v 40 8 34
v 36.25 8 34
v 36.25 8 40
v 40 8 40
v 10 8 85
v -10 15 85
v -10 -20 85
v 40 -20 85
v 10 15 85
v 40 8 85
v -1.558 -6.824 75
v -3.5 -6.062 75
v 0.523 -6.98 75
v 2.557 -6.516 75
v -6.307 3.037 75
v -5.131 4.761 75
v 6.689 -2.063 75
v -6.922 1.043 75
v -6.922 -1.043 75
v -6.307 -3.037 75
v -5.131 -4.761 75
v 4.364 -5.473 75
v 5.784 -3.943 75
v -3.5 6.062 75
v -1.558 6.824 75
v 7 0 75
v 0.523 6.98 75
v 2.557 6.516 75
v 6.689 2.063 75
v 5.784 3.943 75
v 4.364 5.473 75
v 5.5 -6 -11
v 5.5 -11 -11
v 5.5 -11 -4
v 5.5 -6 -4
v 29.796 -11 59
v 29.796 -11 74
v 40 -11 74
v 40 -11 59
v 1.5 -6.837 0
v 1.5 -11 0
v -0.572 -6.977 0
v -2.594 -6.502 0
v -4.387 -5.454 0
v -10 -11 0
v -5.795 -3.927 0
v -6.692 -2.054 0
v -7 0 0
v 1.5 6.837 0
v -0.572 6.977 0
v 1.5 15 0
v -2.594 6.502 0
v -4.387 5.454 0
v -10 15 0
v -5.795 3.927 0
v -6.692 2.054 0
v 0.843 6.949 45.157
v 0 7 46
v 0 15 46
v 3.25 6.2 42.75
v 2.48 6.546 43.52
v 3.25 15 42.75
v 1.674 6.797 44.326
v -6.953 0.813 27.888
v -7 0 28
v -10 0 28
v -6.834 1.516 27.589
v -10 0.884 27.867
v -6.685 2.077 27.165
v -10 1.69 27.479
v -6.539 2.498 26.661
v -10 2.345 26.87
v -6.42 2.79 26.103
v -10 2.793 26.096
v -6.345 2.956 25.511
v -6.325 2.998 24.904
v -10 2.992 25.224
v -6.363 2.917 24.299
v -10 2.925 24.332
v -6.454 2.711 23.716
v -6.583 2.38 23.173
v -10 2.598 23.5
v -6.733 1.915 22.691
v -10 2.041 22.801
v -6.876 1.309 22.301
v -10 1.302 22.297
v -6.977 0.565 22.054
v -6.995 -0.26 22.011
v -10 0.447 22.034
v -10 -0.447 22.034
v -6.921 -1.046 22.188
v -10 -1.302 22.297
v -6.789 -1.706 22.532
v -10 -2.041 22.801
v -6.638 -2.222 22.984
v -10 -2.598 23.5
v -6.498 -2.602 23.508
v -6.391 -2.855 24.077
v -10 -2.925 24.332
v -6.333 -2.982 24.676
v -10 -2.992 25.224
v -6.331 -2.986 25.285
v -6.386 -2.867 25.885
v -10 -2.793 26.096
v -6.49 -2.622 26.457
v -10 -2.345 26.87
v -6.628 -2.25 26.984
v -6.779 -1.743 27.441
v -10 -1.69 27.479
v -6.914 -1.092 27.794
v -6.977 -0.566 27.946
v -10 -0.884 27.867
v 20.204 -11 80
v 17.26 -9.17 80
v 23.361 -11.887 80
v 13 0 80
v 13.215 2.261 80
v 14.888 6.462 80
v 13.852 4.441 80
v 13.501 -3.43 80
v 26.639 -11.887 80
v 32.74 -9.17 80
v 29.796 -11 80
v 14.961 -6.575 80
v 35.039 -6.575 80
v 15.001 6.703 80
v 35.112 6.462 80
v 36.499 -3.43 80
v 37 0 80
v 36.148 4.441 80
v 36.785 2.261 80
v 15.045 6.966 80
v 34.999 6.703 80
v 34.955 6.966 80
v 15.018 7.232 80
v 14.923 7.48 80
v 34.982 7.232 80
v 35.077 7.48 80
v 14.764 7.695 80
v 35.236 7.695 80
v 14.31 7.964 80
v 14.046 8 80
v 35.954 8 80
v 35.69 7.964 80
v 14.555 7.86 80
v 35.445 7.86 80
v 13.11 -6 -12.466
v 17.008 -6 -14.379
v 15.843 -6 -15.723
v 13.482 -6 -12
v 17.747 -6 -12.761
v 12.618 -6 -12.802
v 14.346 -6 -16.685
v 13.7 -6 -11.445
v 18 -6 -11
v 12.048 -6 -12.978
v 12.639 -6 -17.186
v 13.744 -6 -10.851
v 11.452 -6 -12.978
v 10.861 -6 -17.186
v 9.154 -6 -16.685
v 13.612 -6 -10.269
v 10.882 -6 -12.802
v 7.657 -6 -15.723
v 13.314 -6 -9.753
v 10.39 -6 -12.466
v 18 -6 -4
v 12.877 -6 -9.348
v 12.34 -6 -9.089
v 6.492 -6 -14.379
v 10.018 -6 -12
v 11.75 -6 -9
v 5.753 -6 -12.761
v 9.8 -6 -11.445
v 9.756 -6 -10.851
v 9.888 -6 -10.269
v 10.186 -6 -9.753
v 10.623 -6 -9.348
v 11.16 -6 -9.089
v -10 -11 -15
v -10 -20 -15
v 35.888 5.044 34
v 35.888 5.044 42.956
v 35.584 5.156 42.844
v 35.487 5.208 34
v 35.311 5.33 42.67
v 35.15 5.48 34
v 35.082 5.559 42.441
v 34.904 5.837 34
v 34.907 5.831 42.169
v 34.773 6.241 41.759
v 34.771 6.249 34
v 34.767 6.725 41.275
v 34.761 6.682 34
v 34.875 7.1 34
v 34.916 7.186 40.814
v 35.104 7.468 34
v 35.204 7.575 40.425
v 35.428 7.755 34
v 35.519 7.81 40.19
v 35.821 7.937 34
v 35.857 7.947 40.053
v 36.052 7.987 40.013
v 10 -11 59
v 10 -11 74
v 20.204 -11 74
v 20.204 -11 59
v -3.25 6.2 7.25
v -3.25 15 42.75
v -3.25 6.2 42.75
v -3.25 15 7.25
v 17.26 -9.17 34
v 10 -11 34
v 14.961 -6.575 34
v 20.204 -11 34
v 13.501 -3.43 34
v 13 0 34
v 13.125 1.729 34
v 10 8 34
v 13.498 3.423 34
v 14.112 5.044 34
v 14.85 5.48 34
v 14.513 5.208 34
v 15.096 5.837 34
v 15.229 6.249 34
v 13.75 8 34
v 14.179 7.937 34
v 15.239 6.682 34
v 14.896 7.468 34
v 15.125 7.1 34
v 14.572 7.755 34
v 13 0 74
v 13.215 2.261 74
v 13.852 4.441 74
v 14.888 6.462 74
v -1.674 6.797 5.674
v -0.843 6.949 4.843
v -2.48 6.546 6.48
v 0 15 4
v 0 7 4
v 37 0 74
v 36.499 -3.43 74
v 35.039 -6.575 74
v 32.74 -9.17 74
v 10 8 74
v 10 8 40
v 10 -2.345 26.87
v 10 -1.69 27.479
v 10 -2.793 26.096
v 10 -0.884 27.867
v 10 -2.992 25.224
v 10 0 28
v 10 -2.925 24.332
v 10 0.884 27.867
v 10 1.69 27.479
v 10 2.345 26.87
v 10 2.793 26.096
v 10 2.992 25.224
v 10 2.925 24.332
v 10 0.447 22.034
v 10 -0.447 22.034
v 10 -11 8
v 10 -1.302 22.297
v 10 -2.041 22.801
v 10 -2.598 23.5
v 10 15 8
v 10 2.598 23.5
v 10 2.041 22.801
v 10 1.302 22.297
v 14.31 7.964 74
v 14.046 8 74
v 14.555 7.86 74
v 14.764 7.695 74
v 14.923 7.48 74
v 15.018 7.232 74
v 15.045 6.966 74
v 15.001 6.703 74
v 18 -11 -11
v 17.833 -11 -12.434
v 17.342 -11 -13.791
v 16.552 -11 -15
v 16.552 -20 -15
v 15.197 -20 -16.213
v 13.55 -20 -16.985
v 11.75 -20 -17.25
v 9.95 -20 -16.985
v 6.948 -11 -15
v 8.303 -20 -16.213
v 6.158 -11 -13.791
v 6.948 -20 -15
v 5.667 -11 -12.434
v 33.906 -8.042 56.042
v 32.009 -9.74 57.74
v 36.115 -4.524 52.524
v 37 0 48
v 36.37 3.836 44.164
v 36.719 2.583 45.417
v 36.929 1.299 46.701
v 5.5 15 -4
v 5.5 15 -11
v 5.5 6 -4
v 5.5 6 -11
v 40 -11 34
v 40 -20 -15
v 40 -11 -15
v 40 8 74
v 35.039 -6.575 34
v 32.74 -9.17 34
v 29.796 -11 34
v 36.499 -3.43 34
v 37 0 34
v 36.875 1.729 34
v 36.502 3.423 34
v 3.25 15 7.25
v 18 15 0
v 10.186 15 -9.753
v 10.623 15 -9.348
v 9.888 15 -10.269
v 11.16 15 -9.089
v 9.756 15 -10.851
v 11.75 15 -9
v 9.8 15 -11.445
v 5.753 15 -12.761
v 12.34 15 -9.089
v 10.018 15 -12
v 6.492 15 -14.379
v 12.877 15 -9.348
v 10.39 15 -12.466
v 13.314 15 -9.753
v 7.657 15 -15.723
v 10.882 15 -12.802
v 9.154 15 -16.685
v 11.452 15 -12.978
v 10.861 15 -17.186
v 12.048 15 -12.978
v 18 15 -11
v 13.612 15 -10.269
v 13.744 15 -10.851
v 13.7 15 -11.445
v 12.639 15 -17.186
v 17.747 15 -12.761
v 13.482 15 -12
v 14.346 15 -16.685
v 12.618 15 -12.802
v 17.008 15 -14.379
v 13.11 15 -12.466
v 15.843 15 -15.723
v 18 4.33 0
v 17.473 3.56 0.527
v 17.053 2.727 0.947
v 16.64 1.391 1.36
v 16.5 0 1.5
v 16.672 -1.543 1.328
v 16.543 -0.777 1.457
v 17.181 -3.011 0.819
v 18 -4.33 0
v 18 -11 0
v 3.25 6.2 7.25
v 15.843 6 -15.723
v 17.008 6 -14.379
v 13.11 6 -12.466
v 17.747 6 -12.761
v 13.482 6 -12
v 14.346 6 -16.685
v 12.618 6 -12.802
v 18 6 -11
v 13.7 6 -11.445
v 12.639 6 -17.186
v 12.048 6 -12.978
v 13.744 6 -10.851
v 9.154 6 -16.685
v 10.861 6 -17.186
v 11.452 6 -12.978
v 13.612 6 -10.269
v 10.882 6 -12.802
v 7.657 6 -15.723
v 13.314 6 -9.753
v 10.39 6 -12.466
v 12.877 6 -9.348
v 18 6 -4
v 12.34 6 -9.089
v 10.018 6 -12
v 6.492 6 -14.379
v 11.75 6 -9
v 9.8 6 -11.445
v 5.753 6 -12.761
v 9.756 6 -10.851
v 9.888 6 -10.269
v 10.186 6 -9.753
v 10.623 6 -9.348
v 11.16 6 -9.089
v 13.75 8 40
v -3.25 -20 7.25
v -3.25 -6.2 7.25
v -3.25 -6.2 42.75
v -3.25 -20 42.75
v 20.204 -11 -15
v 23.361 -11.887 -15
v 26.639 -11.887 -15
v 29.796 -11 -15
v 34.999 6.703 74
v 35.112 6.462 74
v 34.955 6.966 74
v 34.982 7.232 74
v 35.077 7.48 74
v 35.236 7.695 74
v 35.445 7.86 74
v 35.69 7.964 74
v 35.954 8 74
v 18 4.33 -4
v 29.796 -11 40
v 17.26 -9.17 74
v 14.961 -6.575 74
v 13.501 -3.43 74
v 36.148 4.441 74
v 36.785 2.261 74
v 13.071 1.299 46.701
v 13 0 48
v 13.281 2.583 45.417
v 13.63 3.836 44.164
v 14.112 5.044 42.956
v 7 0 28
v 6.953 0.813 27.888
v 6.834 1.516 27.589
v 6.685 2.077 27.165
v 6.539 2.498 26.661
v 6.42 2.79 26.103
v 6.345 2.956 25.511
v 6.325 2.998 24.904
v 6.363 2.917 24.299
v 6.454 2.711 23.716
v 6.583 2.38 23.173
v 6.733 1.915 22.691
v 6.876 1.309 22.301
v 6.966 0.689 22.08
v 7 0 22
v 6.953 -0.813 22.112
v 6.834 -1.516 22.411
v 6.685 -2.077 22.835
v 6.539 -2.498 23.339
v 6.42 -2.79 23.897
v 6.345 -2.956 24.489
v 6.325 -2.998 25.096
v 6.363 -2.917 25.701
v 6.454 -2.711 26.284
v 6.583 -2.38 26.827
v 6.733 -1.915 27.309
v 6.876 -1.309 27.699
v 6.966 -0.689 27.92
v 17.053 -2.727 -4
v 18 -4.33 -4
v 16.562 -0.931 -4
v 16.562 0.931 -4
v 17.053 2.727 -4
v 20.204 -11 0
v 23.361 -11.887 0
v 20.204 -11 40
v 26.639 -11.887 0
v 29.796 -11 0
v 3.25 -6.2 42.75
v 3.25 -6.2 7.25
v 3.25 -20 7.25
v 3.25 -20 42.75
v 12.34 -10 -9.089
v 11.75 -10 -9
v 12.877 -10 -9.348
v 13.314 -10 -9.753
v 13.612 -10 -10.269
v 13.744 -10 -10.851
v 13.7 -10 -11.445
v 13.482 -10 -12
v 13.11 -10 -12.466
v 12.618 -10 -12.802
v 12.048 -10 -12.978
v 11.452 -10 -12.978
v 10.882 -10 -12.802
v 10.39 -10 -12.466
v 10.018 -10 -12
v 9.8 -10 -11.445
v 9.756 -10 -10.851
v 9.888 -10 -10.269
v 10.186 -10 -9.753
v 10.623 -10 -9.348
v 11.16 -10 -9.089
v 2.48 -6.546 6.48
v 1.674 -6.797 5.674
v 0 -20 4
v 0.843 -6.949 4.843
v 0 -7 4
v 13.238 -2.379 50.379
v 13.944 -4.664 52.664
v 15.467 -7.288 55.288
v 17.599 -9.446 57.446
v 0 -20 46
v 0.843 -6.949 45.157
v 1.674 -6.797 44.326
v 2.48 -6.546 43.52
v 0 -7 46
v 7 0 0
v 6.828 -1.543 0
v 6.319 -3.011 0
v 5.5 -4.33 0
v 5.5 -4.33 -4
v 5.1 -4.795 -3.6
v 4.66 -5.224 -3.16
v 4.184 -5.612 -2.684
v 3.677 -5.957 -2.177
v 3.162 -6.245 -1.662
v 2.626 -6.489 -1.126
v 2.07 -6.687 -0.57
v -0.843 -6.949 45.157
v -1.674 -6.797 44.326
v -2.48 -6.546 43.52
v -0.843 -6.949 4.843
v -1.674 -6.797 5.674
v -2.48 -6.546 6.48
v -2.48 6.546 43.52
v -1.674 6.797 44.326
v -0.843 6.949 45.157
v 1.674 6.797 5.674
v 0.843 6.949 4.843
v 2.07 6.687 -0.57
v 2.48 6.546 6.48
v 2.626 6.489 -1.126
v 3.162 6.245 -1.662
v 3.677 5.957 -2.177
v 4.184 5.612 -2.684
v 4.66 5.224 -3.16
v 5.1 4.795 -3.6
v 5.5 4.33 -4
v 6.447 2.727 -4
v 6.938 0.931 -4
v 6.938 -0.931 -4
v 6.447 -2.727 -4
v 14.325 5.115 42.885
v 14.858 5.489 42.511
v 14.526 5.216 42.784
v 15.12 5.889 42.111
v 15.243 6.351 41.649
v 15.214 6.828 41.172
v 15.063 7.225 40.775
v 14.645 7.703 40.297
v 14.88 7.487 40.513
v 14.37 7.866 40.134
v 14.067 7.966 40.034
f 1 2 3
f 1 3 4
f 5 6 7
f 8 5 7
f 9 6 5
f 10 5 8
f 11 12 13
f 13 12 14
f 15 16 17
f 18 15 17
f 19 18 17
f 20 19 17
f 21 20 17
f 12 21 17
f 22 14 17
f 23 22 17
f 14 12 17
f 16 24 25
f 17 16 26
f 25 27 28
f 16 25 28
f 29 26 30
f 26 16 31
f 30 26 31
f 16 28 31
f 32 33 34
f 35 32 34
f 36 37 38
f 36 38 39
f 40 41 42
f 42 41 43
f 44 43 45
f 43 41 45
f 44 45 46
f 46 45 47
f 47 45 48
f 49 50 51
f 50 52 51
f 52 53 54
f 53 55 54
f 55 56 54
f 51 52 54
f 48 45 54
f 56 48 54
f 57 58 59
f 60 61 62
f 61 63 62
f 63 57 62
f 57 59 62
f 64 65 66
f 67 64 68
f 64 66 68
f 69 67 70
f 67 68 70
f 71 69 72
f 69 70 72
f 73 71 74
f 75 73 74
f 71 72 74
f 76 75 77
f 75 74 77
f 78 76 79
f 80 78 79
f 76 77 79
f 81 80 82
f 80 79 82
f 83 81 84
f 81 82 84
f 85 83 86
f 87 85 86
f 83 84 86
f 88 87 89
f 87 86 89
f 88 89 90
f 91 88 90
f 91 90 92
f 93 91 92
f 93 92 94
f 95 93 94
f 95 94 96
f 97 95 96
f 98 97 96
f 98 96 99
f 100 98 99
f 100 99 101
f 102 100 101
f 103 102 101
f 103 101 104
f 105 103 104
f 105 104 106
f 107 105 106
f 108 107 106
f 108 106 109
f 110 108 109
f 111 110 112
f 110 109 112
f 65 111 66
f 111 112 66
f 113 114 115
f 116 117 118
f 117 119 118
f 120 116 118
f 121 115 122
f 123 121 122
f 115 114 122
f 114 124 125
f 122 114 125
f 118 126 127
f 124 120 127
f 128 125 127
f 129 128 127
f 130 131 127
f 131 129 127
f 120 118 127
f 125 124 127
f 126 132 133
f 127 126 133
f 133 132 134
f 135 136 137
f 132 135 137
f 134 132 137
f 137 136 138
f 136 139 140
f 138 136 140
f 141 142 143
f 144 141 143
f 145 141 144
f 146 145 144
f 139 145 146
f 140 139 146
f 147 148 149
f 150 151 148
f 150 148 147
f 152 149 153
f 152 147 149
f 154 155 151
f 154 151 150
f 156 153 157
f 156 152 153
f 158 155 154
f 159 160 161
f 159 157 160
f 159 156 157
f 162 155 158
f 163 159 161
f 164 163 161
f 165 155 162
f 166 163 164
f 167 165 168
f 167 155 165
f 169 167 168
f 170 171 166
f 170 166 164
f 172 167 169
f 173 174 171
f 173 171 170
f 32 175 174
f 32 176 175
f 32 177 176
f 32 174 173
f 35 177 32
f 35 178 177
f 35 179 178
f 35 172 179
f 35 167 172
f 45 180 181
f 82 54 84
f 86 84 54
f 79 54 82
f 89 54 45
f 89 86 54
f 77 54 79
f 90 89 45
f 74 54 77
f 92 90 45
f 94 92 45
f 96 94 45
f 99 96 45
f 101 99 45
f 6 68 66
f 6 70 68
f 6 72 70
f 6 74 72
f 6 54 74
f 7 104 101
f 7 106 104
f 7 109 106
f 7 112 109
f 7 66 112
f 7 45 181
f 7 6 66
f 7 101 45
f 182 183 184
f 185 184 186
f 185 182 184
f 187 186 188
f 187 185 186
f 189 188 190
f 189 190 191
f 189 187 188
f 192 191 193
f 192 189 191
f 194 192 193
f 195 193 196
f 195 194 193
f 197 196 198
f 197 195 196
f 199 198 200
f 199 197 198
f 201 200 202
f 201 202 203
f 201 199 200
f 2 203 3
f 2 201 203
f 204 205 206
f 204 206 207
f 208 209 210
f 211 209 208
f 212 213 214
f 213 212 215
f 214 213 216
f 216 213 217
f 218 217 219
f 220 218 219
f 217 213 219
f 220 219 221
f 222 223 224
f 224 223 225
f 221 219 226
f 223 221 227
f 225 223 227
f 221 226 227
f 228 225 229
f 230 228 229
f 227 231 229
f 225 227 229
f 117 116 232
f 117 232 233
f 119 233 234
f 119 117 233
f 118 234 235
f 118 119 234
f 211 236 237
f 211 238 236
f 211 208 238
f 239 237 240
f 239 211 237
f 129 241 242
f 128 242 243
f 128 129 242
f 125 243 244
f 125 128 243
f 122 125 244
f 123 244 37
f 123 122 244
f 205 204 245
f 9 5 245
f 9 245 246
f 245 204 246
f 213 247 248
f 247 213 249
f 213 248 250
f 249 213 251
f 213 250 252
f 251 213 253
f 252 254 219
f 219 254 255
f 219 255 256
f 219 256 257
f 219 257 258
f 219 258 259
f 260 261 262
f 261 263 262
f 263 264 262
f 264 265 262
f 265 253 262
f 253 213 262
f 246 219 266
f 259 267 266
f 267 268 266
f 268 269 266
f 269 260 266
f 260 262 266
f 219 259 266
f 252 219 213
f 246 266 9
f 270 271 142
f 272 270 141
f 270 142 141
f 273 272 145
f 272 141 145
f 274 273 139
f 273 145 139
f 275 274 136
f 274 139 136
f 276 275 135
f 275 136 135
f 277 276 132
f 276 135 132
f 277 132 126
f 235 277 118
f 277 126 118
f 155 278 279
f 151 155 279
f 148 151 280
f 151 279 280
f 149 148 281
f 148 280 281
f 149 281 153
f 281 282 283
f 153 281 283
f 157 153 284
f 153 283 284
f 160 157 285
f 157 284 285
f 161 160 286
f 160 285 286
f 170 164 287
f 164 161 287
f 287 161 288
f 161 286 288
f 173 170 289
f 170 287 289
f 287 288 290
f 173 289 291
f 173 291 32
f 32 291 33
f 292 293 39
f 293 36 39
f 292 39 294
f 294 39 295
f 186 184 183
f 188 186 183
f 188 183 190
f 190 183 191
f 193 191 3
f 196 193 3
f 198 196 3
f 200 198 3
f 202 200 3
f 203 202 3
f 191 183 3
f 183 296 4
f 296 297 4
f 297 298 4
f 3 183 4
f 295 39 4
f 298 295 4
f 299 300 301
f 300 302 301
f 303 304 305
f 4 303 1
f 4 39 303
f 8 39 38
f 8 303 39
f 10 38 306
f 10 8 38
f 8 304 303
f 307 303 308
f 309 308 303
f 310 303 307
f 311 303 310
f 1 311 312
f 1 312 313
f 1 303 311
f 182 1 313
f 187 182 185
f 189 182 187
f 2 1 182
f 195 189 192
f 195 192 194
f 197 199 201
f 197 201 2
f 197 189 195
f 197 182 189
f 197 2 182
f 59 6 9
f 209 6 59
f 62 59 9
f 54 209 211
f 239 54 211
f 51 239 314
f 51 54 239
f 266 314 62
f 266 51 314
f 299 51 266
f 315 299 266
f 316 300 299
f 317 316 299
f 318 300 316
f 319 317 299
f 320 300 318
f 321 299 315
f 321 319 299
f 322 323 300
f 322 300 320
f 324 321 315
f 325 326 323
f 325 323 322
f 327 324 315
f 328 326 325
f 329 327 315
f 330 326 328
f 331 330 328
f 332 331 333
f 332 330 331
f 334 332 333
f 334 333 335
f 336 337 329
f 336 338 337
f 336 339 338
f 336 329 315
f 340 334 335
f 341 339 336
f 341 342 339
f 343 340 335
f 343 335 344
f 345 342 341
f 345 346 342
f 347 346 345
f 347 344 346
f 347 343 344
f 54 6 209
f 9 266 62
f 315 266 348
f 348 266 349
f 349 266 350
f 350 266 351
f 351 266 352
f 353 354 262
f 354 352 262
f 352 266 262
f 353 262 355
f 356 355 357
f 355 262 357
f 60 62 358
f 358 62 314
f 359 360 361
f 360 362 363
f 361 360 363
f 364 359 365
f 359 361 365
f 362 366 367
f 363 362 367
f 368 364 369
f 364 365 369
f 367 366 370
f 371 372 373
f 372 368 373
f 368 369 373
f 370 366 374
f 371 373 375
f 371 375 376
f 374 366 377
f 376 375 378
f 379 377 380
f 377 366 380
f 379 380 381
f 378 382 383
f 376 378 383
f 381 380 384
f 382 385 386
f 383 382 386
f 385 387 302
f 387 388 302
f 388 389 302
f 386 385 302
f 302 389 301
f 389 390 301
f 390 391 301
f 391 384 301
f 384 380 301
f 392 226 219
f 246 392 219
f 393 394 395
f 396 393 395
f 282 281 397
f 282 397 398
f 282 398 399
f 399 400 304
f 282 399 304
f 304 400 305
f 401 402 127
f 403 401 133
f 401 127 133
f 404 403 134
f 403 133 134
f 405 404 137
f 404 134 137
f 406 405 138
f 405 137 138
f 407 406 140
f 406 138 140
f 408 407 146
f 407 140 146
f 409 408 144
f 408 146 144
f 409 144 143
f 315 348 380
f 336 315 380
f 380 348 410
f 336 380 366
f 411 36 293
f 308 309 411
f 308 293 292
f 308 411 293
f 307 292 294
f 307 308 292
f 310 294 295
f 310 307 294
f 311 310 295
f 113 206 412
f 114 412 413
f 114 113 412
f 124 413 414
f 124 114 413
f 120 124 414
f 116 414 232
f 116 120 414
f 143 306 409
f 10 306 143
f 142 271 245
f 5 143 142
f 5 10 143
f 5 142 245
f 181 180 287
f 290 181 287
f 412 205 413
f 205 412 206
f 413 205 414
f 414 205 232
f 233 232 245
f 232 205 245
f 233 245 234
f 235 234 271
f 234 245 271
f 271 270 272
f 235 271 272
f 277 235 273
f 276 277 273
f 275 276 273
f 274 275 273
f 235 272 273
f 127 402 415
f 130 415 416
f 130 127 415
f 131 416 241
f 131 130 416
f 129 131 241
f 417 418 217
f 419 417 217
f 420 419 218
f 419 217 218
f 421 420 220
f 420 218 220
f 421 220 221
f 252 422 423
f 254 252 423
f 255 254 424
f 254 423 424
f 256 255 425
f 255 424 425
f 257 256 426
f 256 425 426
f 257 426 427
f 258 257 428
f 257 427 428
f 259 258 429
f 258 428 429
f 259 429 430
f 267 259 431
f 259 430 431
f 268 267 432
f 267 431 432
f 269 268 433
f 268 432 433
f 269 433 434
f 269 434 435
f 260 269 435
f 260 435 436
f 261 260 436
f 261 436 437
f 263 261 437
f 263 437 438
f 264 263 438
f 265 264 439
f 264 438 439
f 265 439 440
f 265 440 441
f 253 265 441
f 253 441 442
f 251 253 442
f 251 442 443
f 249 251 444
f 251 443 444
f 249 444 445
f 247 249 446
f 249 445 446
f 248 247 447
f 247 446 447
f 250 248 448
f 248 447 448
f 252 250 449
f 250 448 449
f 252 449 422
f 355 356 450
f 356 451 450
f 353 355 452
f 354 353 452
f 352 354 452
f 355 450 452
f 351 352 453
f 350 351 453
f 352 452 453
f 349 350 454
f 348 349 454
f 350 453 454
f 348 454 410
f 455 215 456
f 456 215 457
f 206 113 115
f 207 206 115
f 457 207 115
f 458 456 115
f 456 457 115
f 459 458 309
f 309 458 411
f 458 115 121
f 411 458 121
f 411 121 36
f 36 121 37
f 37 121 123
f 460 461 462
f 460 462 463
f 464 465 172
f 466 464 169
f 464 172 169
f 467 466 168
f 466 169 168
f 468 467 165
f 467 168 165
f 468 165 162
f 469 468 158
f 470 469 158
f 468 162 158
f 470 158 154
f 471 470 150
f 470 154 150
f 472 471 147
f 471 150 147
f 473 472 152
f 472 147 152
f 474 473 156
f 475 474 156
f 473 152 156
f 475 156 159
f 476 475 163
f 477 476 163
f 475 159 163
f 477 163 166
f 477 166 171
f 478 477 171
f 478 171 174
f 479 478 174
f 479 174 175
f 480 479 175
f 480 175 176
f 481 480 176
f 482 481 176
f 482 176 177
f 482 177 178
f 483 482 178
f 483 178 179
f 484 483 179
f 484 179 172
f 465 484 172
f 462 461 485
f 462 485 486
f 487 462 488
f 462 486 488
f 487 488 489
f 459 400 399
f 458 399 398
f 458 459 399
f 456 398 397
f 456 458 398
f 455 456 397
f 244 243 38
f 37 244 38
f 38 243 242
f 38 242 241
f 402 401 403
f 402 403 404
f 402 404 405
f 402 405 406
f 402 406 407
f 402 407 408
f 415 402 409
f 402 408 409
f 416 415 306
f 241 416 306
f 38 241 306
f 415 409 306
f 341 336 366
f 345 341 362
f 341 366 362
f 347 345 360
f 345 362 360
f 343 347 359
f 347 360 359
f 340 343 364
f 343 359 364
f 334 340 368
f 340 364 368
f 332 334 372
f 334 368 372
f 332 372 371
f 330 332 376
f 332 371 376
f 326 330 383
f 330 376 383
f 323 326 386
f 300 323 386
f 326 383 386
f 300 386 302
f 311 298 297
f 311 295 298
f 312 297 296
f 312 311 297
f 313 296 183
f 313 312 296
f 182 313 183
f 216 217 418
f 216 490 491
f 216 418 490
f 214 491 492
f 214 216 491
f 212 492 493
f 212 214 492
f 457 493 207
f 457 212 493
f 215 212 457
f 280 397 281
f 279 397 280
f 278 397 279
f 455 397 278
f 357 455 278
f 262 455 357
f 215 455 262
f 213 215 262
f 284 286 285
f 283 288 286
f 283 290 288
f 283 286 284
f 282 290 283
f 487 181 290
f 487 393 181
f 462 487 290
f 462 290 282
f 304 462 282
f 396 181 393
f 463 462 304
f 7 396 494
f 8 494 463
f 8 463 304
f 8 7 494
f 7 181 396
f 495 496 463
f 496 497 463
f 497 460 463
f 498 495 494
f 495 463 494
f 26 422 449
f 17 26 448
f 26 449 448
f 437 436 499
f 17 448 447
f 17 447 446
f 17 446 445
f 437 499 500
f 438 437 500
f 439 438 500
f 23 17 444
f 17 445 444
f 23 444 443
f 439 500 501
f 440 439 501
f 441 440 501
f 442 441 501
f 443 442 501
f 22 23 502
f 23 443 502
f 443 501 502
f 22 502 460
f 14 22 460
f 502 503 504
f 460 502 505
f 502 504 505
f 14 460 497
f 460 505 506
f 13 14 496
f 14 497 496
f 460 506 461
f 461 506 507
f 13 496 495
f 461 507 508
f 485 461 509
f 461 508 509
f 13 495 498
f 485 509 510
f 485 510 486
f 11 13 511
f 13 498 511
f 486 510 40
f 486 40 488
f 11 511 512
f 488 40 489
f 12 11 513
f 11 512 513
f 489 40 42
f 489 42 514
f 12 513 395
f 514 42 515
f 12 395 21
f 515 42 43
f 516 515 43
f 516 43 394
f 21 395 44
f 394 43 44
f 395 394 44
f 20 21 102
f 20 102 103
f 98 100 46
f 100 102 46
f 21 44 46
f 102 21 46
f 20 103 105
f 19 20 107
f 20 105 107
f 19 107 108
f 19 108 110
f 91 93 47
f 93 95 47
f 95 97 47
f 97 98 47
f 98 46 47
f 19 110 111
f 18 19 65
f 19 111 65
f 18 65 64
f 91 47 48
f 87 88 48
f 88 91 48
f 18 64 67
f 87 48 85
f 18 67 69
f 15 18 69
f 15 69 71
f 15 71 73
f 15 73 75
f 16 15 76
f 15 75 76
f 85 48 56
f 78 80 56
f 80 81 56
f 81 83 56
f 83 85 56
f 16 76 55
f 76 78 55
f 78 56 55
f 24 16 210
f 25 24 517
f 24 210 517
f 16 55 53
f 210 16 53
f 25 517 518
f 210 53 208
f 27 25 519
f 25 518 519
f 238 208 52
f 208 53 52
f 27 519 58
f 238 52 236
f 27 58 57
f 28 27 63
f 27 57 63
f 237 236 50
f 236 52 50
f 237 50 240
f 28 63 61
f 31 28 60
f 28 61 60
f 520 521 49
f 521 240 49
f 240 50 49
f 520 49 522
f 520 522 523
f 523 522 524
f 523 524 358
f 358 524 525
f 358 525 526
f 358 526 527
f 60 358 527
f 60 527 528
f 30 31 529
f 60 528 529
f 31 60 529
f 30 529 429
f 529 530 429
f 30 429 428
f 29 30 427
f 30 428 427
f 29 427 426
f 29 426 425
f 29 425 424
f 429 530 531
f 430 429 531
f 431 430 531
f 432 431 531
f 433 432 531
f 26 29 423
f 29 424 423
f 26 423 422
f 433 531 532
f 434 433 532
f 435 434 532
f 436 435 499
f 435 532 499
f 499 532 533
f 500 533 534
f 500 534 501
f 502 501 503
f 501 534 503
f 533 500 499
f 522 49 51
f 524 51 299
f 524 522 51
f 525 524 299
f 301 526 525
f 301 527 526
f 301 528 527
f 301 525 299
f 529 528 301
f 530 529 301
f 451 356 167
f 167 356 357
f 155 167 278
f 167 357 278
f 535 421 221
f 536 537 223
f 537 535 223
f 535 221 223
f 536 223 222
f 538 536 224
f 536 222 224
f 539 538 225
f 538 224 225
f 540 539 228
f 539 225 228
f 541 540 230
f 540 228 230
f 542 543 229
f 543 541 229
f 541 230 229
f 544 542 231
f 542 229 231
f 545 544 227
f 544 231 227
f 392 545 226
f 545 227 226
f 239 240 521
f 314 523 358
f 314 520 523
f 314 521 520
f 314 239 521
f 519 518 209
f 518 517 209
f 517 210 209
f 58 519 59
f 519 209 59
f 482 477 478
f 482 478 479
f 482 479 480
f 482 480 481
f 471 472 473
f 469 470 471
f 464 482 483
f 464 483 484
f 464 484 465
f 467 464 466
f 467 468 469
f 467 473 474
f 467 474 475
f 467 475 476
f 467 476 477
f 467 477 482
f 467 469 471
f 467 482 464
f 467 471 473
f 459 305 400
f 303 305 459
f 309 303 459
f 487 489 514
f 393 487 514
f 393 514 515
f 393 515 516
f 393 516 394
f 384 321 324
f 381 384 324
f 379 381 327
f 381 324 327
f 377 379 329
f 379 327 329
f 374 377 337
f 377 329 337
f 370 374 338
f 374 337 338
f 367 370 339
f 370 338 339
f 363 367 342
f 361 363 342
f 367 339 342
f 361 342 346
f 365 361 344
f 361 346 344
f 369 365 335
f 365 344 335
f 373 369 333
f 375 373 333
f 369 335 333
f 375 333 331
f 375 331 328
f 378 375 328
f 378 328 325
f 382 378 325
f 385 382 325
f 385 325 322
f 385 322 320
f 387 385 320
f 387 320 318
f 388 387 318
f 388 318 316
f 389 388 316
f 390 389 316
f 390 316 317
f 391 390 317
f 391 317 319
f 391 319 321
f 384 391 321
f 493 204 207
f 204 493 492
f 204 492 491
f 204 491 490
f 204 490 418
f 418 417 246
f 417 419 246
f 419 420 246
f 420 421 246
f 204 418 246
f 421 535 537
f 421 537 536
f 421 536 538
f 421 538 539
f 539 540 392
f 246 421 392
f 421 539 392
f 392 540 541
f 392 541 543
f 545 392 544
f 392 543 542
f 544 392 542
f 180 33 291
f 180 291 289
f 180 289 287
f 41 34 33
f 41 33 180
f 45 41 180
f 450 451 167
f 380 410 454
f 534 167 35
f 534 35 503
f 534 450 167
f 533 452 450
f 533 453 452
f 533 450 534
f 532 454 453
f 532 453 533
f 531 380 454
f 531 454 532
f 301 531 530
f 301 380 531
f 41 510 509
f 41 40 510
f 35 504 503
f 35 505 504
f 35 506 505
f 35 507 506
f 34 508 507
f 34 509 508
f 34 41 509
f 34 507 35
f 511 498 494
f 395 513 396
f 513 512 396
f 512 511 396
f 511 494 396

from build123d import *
from build123d.topology import SkipClean

# Parameters (mm, degrees)
SKETCH1_W               = 20
SKETCH1_H               = 30
BOSS_EXTRUDE1_DEPTH     = 85
SKETCH3_R               = 7
CUT_EXTRUDE1_DEPTH      = 75
SKETCH4_R               = 3
CUT_EXTRUDE2_DEPTH      = 89.600225733
SKETCH5_W               = 6.5
SKETCH5_H               = 42
CUT_EXTRUDE3_DEPTH      = 91.691785747
SKETCH6_W               = 85
SKETCH6_H               = 4
BOSS_EXTRUDE2_DEPTH     = 30
BOSS_EXTRUDE3_DEPTH     = 11
SKETCH8_R               = 12
CUT_EXTRUDE4_DEPTH      = 96.131488042
SKETCH9_W               = 30
SKETCH9_H               = 23
BOSS_EXTRUDE4_DEPTH     = 5
BOSS_EXTRUDE5_START     = -45
BOSS_EXTRUDE5_DEPTH     = 6
SKETCH10_W              = 50
SKETCH10_H              = 85
SKETCH10_W_2            = 6.5
SKETCH10_H_2            = 42
BOSS_EXTRUDE6_DEPTH     = 5
BOSS_EXTRUDE7_DEPTH     = 15
BOSS_EXTRUDE8_START     = -9
BOSS_EXTRUDE8_DEPTH     = 35
CUT_EXTRUDE5_DEPTH      = 110.544511501
CUT_EXTRUDE5_DEPTH_BACK = 11
SKETCH13_W              = 12.5
SKETCH13_H              = 12
SKETCH14_R              = 2
CUT_EXTRUDE6_DEPTH      = 25
CUT_EXTRUDE7_DEPTH      = 97.046863561
SKETCH17_R              = 7
CUT_EXTRUDE8_DEPTH      = 10
CHAMFER2_SIZE           = 4
CHAMFER3_START          = 10
CHAMFER3_DEPTH          = 10.204168477
CHAMFER3_START_2        = 29.795831523
CHAMFER3_2_DEPTH        = 10.204168477
CHAMFER3_START_3        = 40
CHAMFER3_3_DEPTH        = 19
BOSS_EXTRUDE9_DEPTH     = 6
FILLET1_R               = 1
BOSS_EXTRUDE10_REACH    = 70.019
CHAMFER5_SIZE           = 3.25


with BuildPart() as part:
    # Sketch1 → Boss-Extrude1 (new body)
    with BuildSketch(Plane.XY):
        Rectangle(SKETCH1_W, SKETCH1_H)
    extrude(amount=BOSS_EXTRUDE1_DEPTH)

    # Sketch3 → Cut-Extrude1 (cut)
    with BuildSketch(Plane.XY):
        Circle(SKETCH3_R)
    extrude(amount=CUT_EXTRUDE1_DEPTH, mode=Mode.SUBTRACT)

    # Sketch4 → Cut-Extrude2 (cut, through all)
    with BuildSketch(Plane.ZY.offset(10)):
        with Locations((25, 0)):
            Circle(SKETCH4_R)
    extrude(amount=-CUT_EXTRUDE2_DEPTH, mode=Mode.SUBTRACT)

    # Sketch5 → Cut-Extrude3 (cut, through all)
    with BuildSketch(Plane(origin=(0, 15, 0), x_dir=(1, 0, 0), z_dir=(0, 1, 0))):
        with Locations((0, -25)):
            Rectangle(SKETCH5_W, SKETCH5_H)
    extrude(amount=-CUT_EXTRUDE3_DEPTH, mode=Mode.SUBTRACT)

    # Sketch6 → Boss-Extrude2 (add)
    with BuildSketch(Plane(origin=(10, 0, 0), x_dir=(0, 0, -1), z_dir=(1, 0, 0))):
        with Locations((-42.5, -13)):
            Rectangle(SKETCH6_W, SKETCH6_H)
    extrude(amount=BOSS_EXTRUDE2_DEPTH)

    # Sketch7 → Boss-Extrude3 (add)
    with BuildSketch(Plane.XY.offset(85)):
        with BuildLine():
            Line((10, -11), (20.204168477, -11))
            ThreePointArc((20.204168477, -11), (14.96132533, -6.574573055), (13, 0))
            Line((13, 0), (13, 8))
            Line((13, 8), (10, 8))
            Line((10, 8), (10, -11))
        make_face()
        with BuildLine():
            Line((40, -11), (40, 8))
            Line((40, 8), (37, 8))
            Line((37, 8), (37, 0))
            ThreePointArc((37, 0), (35.03867467, -6.574573055), (29.795831523, -11))
            Line((29.795831523, -11), (40, -11))
        make_face()
    extrude(amount=-BOSS_EXTRUDE3_DEPTH)

    # Sketch8 → Cut-Extrude4 (cut, through all)
    with SkipClean():  # the faces are left unmerged after this step: merging them gives an invalid solid
        with BuildSketch(Plane.XY.offset(85)):
            with Locations((25, 0)):
                Circle(SKETCH8_R)
        extrude(amount=-CUT_EXTRUDE4_DEPTH, mode=Mode.SUBTRACT)

    # Sketch9 → Boss-Extrude4 (add)
    with SkipClean():  # the faces are left unmerged after this step: merging them gives an invalid solid
        with BuildSketch(Plane.XY.offset(85)):
            with Locations((25, -3.5)):
                Rectangle(SKETCH9_W, SKETCH9_H)
        extrude(amount=-BOSS_EXTRUDE4_DEPTH)

    # Sketch7<3> → Boss-Extrude5 (add)
    with SkipClean():  # the faces are left unmerged after this step: merging them gives an invalid solid
        with BuildSketch(Plane.XY.offset(85).offset(BOSS_EXTRUDE5_START)):
            with BuildLine():
                Line((40, -11), (40, 0))
                Line((40, 0), (40, 8))
                Line((40, 8), (37, 8))
                Line((37, 8), (37, 0))
                ThreePointArc((37, 0), (35.03867467, -6.574573055), (29.795831523, -11))
                Line((29.795831523, -11), (40, -11))
            make_face()
            with BuildLine():
                Line((10, -11), (20.204168477, -11))
                ThreePointArc((20.204168477, -11), (14.96132533, -6.574573055), (13, 0))
                Line((13, 0), (13, 8))
                Line((13, 8), (10, 8))
                Line((10, 8), (10, -11))
            make_face()
        extrude(amount=-BOSS_EXTRUDE5_DEPTH)

    # Sketch10 → Boss-Extrude6 (add)
    with SkipClean():  # the faces are left unmerged after this step: merging them gives an invalid solid
        with BuildSketch(Plane.XZ.offset(15)):
            with Locations((15, 42.5)):
                Rectangle(SKETCH10_W, SKETCH10_H)
            with Locations((0, 25)):
                Rectangle(SKETCH10_W_2, SKETCH10_H_2, mode=Mode.SUBTRACT)
        extrude(amount=BOSS_EXTRUDE6_DEPTH)

    # Sketch11 → Boss-Extrude7 (add)
    with BuildSketch(Plane(origin=(0, 0, 0), x_dir=(-1, 0, 0), z_dir=(0, 0, -1))):
        with BuildLine():
            Line((-10, -11), (10, -11))
            Line((10, -11), (10, -20))
            Line((10, -20), (-40, -20))
            Line((-40, -20), (-40, -11))
            Line((-40, -11), (-29.795831523, -11))
            ThreePointArc((-29.795831523, -11), (-25, -12), (-20.204168477, -11))
            Line((-20.204168477, -11), (-10, -11))
        make_face()
    extrude(amount=BOSS_EXTRUDE7_DEPTH)

    # Sketch12 → Boss-Extrude8 (add)
    with SkipClean():  # the faces are left unmerged after this step: merging them gives an invalid solid
        with BuildSketch(Plane(origin=(0, -11, 0), x_dir=(1, 0, 0), z_dir=(0, 1, 0)).offset(BOSS_EXTRUDE8_START)):
            with BuildLine():
                Line((5.5, 0), (10, 0))
                Line((10, 0), (10, -8))
                Line((10, -8), (18, 0))
                Line((18, 0), (18, 11))
                ThreePointArc((18, 11), (11.75, 17.25), (5.5, 11))
                Line((5.5, 11), (5.5, 0))
            make_face()
        extrude(amount=BOSS_EXTRUDE8_DEPTH)

    # Sketch13 → Cut-Extrude5 (cut, two sides: drawn at the far end of the back side and taken through both)
    with BuildSketch(Plane(origin=(0, 0, -15), x_dir=(-1, 0, 0), z_dir=(0, 0, -1)).offset(-CUT_EXTRUDE5_DEPTH_BACK)):
        with Locations((-11.75, 0)):
            Rectangle(SKETCH13_W, SKETCH13_H)
    extrude(amount=CUT_EXTRUDE5_DEPTH + CUT_EXTRUDE5_DEPTH_BACK, mode=Mode.SUBTRACT)

    # Sketch14 → Cut-Extrude6 (cut)
    with BuildSketch(Plane(origin=(0, 15, 0), x_dir=(1, 0, 0), z_dir=(0, 1, 0))):
        with Locations(Location((11.75, 11, 0), (0, 0, 270))):
            Circle(SKETCH14_R)
    extrude(amount=-CUT_EXTRUDE6_DEPTH, mode=Mode.SUBTRACT)

    # Sketch16 → Cut-Extrude7 (cut, through all)
    with SkipClean():  # the faces are left unmerged after this step: merging them gives an invalid solid
        with BuildSketch(Plane.XY):
            with BuildLine():
                Line((5.5, 4.330127019), (5.5, -4.330127019))
                ThreePointArc((5.5, -4.330127019), (7, 0), (5.5, 4.330127019))
            make_face()
        extrude(amount=-CUT_EXTRUDE7_DEPTH, mode=Mode.SUBTRACT)

    # Sketch17 → Cut-Extrude8 (cut)
    with SkipClean():  # the faces are left unmerged after this step: merging them gives an invalid solid
        with BuildSketch(Plane(origin=(0, 0, -4), x_dir=(-1, 0, 0), z_dir=(0, 0, -1))):
            with Locations((-23.5, 0)):
                Circle(SKETCH17_R)
        extrude(amount=-CUT_EXTRUDE8_DEPTH, mode=Mode.SUBTRACT)

    # Chamfer2
    # the kernel refuses this chamfer: 4 mm, written as the material it adds along each edge
    with BuildSketch(Plane(origin=(5.5, -21.286731952, 0), x_dir=(-1, 0, 0), z_dir=(0, 1, 0))) as chamfer2_piece_1_section:
        Polygon((CHAMFER2_SIZE, 0), (0, -CHAMFER2_SIZE), (0, 0), align=None)
    chamfer2_piece_1 = extrude(amount=27.243336885, mode=Mode.PRIVATE)
    chamfer2_piece_1 = chamfer2_piece_1 - Plane(origin=(0, 0, 0), x_dir=(1, 0, 0), z_dir=(0, 0, -1)) * Cylinder(7, 71, mode=Mode.PRIVATE)
    chamfer2_piece_1 = split(chamfer2_piece_1, bisect_by=Plane(origin=(5.5, -20, 0), z_dir=(0, 1, 0)), keep=Keep.TOP, mode=Mode.PRIVATE)
    add(chamfer2_piece_1)
    with BuildSketch(Plane(origin=(5.5, -5.956604933, 0), x_dir=(-1, 0, 0), z_dir=(0, 1, 0))) as chamfer2_piece_2_section:
        Polygon((CHAMFER2_SIZE, 0), (0, -CHAMFER2_SIZE), (0, 0), align=None)
    chamfer2_piece_2 = extrude(amount=20.956604933, mode=Mode.PRIVATE)
    chamfer2_piece_2 = chamfer2_piece_2 - Plane(origin=(0, 0, 0), x_dir=(1, 0, 0), z_dir=(0, 0, -1)) * Cylinder(7, 58, mode=Mode.PRIVATE)
    add(chamfer2_piece_2)

    # Chamfer3: read off the stored shape, not the designer's step
    # Chamfer3 outline → Chamfer3 (add)
    with SkipClean():  # the faces are left unmerged after this step: merging them gives an invalid solid
        with BuildSketch(Plane.YZ.offset(CHAMFER3_START)):
            Polygon((8, 40), (-11, 59), (-11, 40), align=None)
        extrude(amount=CHAMFER3_DEPTH)
    add(part.part.scale(1), mode=Mode.REPLACE)  # the faces are merged on a copy

    # Chamfer3 2 outline → Chamfer3 2 (add)
    with BuildSketch(Plane.YZ.offset(CHAMFER3_START_2)):
        Polygon((8, 40), (-11, 59), (-11, 40), align=None)
    extrude(amount=CHAMFER3_2_DEPTH)

    # Chamfer3 3 outline → Chamfer3 3 (cut)
    with BuildSketch(Plane.XY.offset(CHAMFER3_START_3)):
        with BuildLine():
            ThreePointArc((29.795831523, -11), (35.03867467, -6.574573055), (37, 0))
            Line((37, 0), (37, 9))
            Line((37, 9), (29.795831523, 9))
            Line((29.795831523, 9), (29.795831523, -11))
        make_face()
        with BuildLine():
            ThreePointArc((13, 0), (14.96132533, -6.574573055), (20.204168477, -11))
            Line((20.204168477, -11), (20.204168477, 9))
            Line((20.204168477, 9), (13, 9))
            Line((13, 9), (13, 0))
        make_face()
    extrude(amount=CHAMFER3_3_DEPTH, mode=Mode.SUBTRACT)

    # Sketch19 → Boss-Extrude9 (add)
    with BuildSketch(Plane(origin=(0, 0, 80), x_dir=(-1, 0, 0), z_dir=(0, 0, -1))):
        with BuildLine():
            Line((-37, 0), (-37, 8))
            Line((-37, 8), (-33.94427191, 8))
            ThreePointArc((-33.94427191, 8), (-36.210068308, 4.281865077), (-37, 0))
        make_face()
        with BuildLine():
            Line((-13, 8), (-13, 0))
            ThreePointArc((-13, 0), (-13.789931692, 4.281865077), (-16.05572809, 8))
            Line((-16.05572809, 8), (-13, 8))
        make_face()
    extrude(amount=BOSS_EXTRUDE9_DEPTH)

    # Fillet1
    # the kernel refuses this fillet: 1 mm, written as the material it takes off along each edge
    with BuildSketch(Plane(origin=(33.94427191, 8, 80), x_dir=(1, 0, 0), z_dir=(0, 0, -1))) as fillet1_piece_1:
        with BuildLine():
            CenterArc((2.01017924, 1), FILLET1_R, 147.421029607, 122.578970393)
            ThreePointArc((1.167529152, 1.538461538), (0.61476545, 0.745704393), (0, 0))
            Line((0, 0), (2.01017924, 0))
        make_face()
    extrude(amount=11.0254481, mode=Mode.SUBTRACT)
    with BuildSketch(Plane(origin=(16.05572809, 8, 80), x_dir=(-1, 0, 0), z_dir=(0, 0, -1))) as fillet1_piece_2:
        with BuildLine():
            CenterArc((2.01017924, -1), FILLET1_R, 90, 122.578970393)
            ThreePointArc((1.167529152, -1.538461538), (0.61476545, -0.745704393), (0, 0))
            Line((0, 0), (2.01017924, 0))
        make_face()
    extrude(amount=11.0254481, mode=Mode.SUBTRACT)

    # Boss-Extrude10: up to this plane
    boss_extrude10_end = Plane(origin=(40, -11, 59), z_dir=(0, -0.7071067811865512, -0.7071067811865438))
    # Sketch20 → Boss-Extrude10 (add, up to the surface)
    with BuildSketch(Plane(origin=(0, 0, 34), x_dir=(-1, 0, 0), z_dir=(0, 0, -1)), mode=Mode.PRIVATE) as boss_extrude10_sk1:
        with BuildLine():
            Line((-36.25, 8), (-37, 8))
            Line((-37, 8), (-37, 0))
            ThreePointArc((-37, 0), (-36.718784369, 2.582652302), (-35.888317848, 5.044257571))
            ThreePointArc((-35.888317848, 5.044257571), (-34.761105503, 6.68218995), (-36.25, 8))
        make_face()
    boss_extrude10_tool1 = split(extrude(boss_extrude10_sk1.sketch, amount=-BOSS_EXTRUDE10_REACH, mode=Mode.PRIVATE), bisect_by=boss_extrude10_end, keep=Keep.BOTH, mode=Mode.PRIVATE)
    add(boss_extrude10_tool1.solids().sort_by_distance((36.164364, 5.853869, 34))[0])
    # Sketch20 → Boss-Extrude10 (add, up to the surface)
    with BuildSketch(Plane(origin=(0, 0, 34), x_dir=(-1, 0, 0), z_dir=(0, 0, -1)), mode=Mode.PRIVATE) as boss_extrude10_sk2:
        with BuildLine():
            Line((-13.75, 8), (-13, 8))
            Line((-13, 8), (-13, 0))
            ThreePointArc((-13, 0), (-13.281215631, 2.582652302), (-14.111682152, 5.044257571))
            ThreePointArc((-14.111682152, 5.044257571), (-15.238894497, 6.68218995), (-13.75, 8))
        make_face()
    boss_extrude10_tool2 = split(extrude(boss_extrude10_sk2.sketch, amount=-BOSS_EXTRUDE10_REACH, mode=Mode.PRIVATE), bisect_by=boss_extrude10_end, keep=Keep.BOTH, mode=Mode.PRIVATE)
    add(boss_extrude10_tool2.solids().sort_by_distance((13.835636, 5.853869, 34))[0])

    # Chamfer5
    # the kernel refuses this chamfer: 3.25 mm, written as the material it adds along each edge
    with BuildSketch(Plane(origin=(3.25, 2.158171327, 4), x_dir=(0, 0, 1), z_dir=(0, -1, 0))) as chamfer5_piece_1_section:
        Polygon((CHAMFER5_SIZE, 0), (0, CHAMFER5_SIZE), (0, 0), align=None)
    chamfer5_piece_1 = extrude(amount=22.158171327, mode=Mode.PRIVATE)
    chamfer5_piece_1 = chamfer5_piece_1 - Plane(origin=(0, 0, 4), x_dir=(1, 0, 0), z_dir=(0, 0, -1)) * Cylinder(7, 58, mode=Mode.PRIVATE)
    add(chamfer5_piece_1)
    with BuildSketch(Plane(origin=(3.25, 15, 46), x_dir=(-1, 0, 0), z_dir=(0, -1, 0))) as chamfer5_piece_2_section:
        Polygon((CHAMFER5_SIZE, 0), (0, CHAMFER5_SIZE), (0, 0), align=None)
    chamfer5_piece_2 = extrude(amount=17.158171327, mode=Mode.PRIVATE)
    chamfer5_piece_2 = chamfer5_piece_2 - Plane(origin=(0, 0, 46), x_dir=(1, 0, 0), z_dir=(0, 0, -1)) * Cylinder(7, 48, mode=Mode.PRIVATE)
    add(chamfer5_piece_2)
    with BuildSketch(Plane(origin=(-3.25, 15, 46), x_dir=(0, 0, -1), z_dir=(0, -1, 0))) as chamfer5_piece_3_section:
        Polygon((CHAMFER5_SIZE, 0), (0, CHAMFER5_SIZE), (0, 0), align=None)
    chamfer5_piece_3 = extrude(amount=17.158171327, mode=Mode.PRIVATE)
    chamfer5_piece_3 = chamfer5_piece_3 - Plane(origin=(0, 0, 46), x_dir=(1, 0, 0), z_dir=(0, 0, -1)) * Cylinder(7, 48, mode=Mode.PRIVATE)
    add(chamfer5_piece_3)
    with BuildSketch(Plane(origin=(-3.25, 15, 4), x_dir=(0, 0, 1), z_dir=(0, -1, 0))) as chamfer5_piece_4_section:
        Polygon((CHAMFER5_SIZE, 0), (0, -CHAMFER5_SIZE), (0, 0), align=None)
    chamfer5_piece_4 = extrude(amount=17.158171327, mode=Mode.PRIVATE)
    chamfer5_piece_4 = chamfer5_piece_4 - Plane(origin=(0, 0, 4), x_dir=(1, 0, 0), z_dir=(0, 0, -1)) * Cylinder(7, 48, mode=Mode.PRIVATE)
    add(chamfer5_piece_4)
    with BuildSketch(Plane(origin=(3.25, 15, 4), x_dir=(-1, 0, 0), z_dir=(0, -1, 0))) as chamfer5_piece_5_section:
        Polygon((CHAMFER5_SIZE, 0), (0, -CHAMFER5_SIZE), (0, 0), align=None)
    chamfer5_piece_5 = extrude(amount=17.158171327, mode=Mode.PRIVATE)
    chamfer5_piece_5 = chamfer5_piece_5 - Plane(origin=(0, 0, 4), x_dir=(1, 0, 0), z_dir=(0, 0, -1)) * Cylinder(7, 48, mode=Mode.PRIVATE)
    add(chamfer5_piece_5)
    with BuildSketch(Plane(origin=(3.25, -20, 46), x_dir=(0, 0, -1), z_dir=(0, 1, 0))) as chamfer5_piece_6_section:
        Polygon((CHAMFER5_SIZE, 0), (0, CHAMFER5_SIZE), (0, 0), align=None)
    chamfer5_piece_6 = extrude(amount=22.158171327, mode=Mode.PRIVATE)
    chamfer5_piece_6 = chamfer5_piece_6 - Plane(origin=(0, 0, 46), x_dir=(1, 0, 0), z_dir=(0, 0, -1)) * Cylinder(7, 58, mode=Mode.PRIVATE)
    add(chamfer5_piece_6)
    with BuildSketch(Plane(origin=(-3.25, -20, 46), x_dir=(1, 0, 0), z_dir=(0, 1, 0))) as chamfer5_piece_7_section:
        Polygon((CHAMFER5_SIZE, 0), (0, CHAMFER5_SIZE), (0, 0), align=None)
    chamfer5_piece_7 = extrude(amount=22.158171327, mode=Mode.PRIVATE)
    chamfer5_piece_7 = chamfer5_piece_7 - Plane(origin=(0, 0, 46), x_dir=(1, 0, 0), z_dir=(0, 0, -1)) * Cylinder(7, 58, mode=Mode.PRIVATE)
    add(chamfer5_piece_7)
    with BuildSketch(Plane(origin=(-3.25, 2.158171327, 4), x_dir=(1, 0, 0), z_dir=(0, -1, 0))) as chamfer5_piece_8_section:
        Polygon((CHAMFER5_SIZE, 0), (0, CHAMFER5_SIZE), (0, 0), align=None)
    chamfer5_piece_8 = extrude(amount=22.158171327, mode=Mode.PRIVATE)
    chamfer5_piece_8 = chamfer5_piece_8 - Plane(origin=(0, 0, 4), x_dir=(1, 0, 0), z_dir=(0, 0, -1)) * Cylinder(7, 58, mode=Mode.PRIVATE)
    add(chamfer5_piece_8)


solid = part.part
